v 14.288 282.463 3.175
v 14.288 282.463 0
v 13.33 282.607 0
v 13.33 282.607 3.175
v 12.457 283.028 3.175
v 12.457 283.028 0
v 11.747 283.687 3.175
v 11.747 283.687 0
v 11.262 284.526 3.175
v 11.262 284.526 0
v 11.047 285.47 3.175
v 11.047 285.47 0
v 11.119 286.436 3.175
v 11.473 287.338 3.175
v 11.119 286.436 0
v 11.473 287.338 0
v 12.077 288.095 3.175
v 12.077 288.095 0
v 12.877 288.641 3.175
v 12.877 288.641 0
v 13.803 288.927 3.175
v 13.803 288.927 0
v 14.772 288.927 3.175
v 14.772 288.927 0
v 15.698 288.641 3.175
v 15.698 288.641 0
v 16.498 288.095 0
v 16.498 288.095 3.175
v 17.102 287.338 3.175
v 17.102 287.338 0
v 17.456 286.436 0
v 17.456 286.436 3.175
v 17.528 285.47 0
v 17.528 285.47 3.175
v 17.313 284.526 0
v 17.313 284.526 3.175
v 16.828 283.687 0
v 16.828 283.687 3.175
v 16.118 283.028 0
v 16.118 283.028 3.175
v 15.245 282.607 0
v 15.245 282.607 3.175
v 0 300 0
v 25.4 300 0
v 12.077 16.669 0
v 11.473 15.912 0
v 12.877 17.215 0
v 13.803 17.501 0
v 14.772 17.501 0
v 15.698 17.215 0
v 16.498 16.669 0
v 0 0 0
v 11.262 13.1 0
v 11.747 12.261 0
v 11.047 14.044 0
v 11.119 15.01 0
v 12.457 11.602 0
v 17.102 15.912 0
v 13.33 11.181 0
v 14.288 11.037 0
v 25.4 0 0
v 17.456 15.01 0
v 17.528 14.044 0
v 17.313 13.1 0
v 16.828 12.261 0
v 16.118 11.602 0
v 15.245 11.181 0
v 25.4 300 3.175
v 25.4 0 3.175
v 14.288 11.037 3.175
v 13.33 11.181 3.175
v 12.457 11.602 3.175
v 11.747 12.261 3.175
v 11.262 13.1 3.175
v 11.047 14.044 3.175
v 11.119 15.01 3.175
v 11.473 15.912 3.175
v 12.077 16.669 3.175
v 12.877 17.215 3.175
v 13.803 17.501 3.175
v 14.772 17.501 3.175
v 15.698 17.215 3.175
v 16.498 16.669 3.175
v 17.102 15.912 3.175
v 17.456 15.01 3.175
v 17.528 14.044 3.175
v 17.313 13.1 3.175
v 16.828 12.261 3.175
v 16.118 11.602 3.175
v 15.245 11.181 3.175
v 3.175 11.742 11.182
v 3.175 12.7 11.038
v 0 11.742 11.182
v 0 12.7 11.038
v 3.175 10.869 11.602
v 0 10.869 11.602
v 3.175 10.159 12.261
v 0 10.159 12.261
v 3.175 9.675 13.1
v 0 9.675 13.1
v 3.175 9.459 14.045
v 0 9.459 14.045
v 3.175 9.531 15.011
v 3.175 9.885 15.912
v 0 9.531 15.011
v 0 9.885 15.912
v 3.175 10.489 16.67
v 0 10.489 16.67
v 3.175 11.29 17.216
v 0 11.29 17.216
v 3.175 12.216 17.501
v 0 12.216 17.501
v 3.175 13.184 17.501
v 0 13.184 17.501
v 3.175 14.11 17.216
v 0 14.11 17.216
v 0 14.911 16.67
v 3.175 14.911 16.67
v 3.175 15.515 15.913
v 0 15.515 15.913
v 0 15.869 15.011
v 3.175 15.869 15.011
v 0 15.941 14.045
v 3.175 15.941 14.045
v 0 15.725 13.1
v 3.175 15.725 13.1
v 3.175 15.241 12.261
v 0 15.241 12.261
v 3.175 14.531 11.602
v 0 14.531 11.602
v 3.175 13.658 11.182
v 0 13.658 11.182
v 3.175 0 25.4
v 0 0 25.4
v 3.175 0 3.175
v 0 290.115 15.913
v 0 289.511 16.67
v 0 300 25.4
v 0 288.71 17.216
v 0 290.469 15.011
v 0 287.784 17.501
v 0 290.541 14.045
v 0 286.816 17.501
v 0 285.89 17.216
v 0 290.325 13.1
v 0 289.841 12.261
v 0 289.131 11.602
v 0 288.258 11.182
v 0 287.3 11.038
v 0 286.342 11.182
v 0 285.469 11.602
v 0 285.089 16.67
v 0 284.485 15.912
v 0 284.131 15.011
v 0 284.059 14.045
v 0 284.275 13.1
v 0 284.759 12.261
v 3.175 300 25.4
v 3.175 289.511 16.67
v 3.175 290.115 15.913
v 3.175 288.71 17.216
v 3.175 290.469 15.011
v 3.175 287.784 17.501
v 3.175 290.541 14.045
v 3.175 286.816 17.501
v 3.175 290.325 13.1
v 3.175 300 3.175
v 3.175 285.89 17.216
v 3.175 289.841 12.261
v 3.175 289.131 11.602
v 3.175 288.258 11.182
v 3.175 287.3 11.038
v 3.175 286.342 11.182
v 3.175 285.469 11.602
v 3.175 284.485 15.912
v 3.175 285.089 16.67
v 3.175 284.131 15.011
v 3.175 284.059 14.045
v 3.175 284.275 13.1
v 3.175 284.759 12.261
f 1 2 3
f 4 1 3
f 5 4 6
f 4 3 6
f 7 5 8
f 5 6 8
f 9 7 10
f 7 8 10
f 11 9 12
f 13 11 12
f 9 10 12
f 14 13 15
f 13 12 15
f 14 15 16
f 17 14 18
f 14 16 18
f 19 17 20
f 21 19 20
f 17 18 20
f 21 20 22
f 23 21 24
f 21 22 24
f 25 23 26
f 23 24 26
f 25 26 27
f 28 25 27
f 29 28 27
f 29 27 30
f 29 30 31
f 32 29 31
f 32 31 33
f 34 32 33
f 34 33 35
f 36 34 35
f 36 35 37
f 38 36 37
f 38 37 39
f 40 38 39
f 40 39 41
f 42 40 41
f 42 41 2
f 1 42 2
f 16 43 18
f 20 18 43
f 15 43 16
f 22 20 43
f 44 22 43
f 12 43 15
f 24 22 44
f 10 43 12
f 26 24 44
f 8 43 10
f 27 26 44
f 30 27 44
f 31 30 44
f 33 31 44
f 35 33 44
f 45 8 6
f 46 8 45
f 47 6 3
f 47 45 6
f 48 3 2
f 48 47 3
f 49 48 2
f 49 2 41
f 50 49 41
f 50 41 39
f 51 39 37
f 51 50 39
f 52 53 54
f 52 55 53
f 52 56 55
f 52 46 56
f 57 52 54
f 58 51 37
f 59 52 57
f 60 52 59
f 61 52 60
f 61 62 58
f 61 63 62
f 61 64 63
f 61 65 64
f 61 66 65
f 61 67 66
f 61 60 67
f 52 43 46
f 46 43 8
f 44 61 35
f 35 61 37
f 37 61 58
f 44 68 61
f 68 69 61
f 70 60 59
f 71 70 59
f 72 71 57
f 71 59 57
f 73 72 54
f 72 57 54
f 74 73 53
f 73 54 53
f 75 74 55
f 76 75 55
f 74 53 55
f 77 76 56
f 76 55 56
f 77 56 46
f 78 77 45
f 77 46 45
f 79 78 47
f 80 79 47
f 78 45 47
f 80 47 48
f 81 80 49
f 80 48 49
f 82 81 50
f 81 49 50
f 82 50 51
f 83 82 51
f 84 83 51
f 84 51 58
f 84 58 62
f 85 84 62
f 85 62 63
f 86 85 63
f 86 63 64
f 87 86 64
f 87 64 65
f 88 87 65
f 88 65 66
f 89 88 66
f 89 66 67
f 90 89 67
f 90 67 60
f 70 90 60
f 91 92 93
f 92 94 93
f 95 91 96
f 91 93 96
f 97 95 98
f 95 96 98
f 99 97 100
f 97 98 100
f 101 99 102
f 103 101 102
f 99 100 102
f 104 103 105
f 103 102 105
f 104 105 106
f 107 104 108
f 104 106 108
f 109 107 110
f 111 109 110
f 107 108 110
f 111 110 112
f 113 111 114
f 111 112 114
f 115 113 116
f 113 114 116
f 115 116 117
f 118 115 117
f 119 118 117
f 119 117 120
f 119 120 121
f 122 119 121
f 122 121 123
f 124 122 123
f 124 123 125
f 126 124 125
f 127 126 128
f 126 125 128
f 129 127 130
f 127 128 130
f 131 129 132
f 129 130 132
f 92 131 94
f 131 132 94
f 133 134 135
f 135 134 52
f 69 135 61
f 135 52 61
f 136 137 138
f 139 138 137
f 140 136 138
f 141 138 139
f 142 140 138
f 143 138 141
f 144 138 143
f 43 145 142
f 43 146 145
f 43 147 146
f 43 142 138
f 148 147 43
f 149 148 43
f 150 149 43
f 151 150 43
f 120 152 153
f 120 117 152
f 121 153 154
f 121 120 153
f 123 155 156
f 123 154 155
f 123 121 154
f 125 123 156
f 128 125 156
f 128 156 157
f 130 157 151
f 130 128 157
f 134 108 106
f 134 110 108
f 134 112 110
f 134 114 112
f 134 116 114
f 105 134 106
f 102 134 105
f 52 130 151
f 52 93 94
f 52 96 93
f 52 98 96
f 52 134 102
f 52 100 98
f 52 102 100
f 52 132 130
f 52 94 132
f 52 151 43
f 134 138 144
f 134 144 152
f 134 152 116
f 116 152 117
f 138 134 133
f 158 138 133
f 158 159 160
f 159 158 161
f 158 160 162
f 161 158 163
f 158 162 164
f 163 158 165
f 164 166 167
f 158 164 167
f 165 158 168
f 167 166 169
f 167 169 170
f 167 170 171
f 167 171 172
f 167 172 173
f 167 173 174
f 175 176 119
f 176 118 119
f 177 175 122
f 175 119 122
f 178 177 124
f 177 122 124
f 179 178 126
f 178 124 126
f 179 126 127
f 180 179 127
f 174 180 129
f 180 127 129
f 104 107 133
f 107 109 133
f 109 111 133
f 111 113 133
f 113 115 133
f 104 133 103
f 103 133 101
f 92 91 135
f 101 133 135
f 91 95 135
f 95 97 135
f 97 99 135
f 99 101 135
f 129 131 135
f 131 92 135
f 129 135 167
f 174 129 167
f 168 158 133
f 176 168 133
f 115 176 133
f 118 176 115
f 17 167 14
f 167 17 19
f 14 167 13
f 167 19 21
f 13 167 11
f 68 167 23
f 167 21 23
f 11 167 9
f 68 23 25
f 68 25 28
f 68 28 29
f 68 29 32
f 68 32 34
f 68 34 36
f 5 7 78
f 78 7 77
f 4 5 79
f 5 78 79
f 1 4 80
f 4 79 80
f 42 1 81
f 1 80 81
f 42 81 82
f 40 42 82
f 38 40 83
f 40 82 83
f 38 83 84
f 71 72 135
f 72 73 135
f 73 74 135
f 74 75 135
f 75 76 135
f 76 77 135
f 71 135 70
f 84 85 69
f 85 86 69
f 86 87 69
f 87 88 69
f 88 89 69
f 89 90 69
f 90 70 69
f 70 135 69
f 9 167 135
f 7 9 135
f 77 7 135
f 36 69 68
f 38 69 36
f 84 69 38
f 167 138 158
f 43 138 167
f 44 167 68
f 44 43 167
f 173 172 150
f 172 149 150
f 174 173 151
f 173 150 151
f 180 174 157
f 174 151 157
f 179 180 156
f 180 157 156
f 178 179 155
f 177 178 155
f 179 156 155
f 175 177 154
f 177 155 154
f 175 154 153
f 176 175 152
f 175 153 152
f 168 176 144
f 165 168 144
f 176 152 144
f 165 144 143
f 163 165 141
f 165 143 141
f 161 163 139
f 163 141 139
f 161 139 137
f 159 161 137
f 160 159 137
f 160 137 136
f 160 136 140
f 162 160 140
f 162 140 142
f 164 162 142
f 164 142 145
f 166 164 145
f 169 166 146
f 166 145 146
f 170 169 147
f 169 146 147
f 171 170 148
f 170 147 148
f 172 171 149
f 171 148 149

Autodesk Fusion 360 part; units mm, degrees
sketch "Sketch1" plane through (0, 0, 0) normal (0, 1, 0) x (1, 0, 0)
  line L0 (0, -25.4) -> (0, 0)
  line L1 (0, 0) -> (25.4, 0)
  line L2 (12.7, -12.7) -> (11.05, -11.05) construction
  line L3 (3.175, -25.4) -> (3.175, -3.175)
  line L4 (3.175, -3.175) -> (25.4, -3.175)
  line L5 (25.4, -3.175) -> (25.4, 0)
  line L6 (0, -25.4) -> (3.175, -25.4)
  dimension "d1" = 25.4
  dimension "d2" = 25.4
  dimension "d13" = 3.175
extrude "Extrude1" add sketch "Sketch1" along normal blind 300
sketch "Sketch2" plane through (3.175, 0, 0) normal (1, 0, 0) x (0, 0, -1)
  line L0 (-25.4, 0) -> (-3.175, 0)
  line L1 (-3.175, 0) -> (-3.175, 300)
  line L2 (-3.175, 300) -> (-25.4, 300)
  line L3 (-25.4, 300) -> (-25.4, 0)
  circle A0 centre (-14.2875, 287.3) radius 2.76
  circle A1 centre (-14.2875, 12.7) radius 2.5546
  line L4 (-14.2875, 300) -> (-14.2875, 0) construction
  dimension "d14" = 12.7
  dimension "d15" = 12.7
hole "Hole1" at (3.175, 12.7, 14.2875) at (3.175, 287.3, 14.2875) direction (-1, 0, 0) diameter 6.5 end through all
sketch "Sketch3" plane through (0, 0, 3.175) normal (0, 0, 1) x (1, 0, 0)
  line L0 (3.175, 0) -> (25.4, 0)
  line L1 (25.4, 0) -> (25.4, 300)
  line L2 (25.4, 300) -> (3.175, 300)
  line L3 (3.175, 300) -> (3.175, 0)
  line L4 (14.2875, 0) -> (14.2875, 300) construction
  circle A0 centre (14.2875, 285.713) radius 2.8949
  circle A1 centre (14.2875, 14.287) radius 4.0168
  dimension "d19" = 14.287
  dimension "d20" = 14.287
hole "Hole2" at (14.2875, 14.287, 3.175) at (14.2875, 285.713, 3.175) direction (0, 0, -1) diameter 6.5 end through all
equation "d14 = ( 25.4 / 2 ) * 1 mm"
equation "d15 = ( 25.4 / 2 ) * 1 mm"
equation "d19 = 25.4 mm - 11.113 mm"
